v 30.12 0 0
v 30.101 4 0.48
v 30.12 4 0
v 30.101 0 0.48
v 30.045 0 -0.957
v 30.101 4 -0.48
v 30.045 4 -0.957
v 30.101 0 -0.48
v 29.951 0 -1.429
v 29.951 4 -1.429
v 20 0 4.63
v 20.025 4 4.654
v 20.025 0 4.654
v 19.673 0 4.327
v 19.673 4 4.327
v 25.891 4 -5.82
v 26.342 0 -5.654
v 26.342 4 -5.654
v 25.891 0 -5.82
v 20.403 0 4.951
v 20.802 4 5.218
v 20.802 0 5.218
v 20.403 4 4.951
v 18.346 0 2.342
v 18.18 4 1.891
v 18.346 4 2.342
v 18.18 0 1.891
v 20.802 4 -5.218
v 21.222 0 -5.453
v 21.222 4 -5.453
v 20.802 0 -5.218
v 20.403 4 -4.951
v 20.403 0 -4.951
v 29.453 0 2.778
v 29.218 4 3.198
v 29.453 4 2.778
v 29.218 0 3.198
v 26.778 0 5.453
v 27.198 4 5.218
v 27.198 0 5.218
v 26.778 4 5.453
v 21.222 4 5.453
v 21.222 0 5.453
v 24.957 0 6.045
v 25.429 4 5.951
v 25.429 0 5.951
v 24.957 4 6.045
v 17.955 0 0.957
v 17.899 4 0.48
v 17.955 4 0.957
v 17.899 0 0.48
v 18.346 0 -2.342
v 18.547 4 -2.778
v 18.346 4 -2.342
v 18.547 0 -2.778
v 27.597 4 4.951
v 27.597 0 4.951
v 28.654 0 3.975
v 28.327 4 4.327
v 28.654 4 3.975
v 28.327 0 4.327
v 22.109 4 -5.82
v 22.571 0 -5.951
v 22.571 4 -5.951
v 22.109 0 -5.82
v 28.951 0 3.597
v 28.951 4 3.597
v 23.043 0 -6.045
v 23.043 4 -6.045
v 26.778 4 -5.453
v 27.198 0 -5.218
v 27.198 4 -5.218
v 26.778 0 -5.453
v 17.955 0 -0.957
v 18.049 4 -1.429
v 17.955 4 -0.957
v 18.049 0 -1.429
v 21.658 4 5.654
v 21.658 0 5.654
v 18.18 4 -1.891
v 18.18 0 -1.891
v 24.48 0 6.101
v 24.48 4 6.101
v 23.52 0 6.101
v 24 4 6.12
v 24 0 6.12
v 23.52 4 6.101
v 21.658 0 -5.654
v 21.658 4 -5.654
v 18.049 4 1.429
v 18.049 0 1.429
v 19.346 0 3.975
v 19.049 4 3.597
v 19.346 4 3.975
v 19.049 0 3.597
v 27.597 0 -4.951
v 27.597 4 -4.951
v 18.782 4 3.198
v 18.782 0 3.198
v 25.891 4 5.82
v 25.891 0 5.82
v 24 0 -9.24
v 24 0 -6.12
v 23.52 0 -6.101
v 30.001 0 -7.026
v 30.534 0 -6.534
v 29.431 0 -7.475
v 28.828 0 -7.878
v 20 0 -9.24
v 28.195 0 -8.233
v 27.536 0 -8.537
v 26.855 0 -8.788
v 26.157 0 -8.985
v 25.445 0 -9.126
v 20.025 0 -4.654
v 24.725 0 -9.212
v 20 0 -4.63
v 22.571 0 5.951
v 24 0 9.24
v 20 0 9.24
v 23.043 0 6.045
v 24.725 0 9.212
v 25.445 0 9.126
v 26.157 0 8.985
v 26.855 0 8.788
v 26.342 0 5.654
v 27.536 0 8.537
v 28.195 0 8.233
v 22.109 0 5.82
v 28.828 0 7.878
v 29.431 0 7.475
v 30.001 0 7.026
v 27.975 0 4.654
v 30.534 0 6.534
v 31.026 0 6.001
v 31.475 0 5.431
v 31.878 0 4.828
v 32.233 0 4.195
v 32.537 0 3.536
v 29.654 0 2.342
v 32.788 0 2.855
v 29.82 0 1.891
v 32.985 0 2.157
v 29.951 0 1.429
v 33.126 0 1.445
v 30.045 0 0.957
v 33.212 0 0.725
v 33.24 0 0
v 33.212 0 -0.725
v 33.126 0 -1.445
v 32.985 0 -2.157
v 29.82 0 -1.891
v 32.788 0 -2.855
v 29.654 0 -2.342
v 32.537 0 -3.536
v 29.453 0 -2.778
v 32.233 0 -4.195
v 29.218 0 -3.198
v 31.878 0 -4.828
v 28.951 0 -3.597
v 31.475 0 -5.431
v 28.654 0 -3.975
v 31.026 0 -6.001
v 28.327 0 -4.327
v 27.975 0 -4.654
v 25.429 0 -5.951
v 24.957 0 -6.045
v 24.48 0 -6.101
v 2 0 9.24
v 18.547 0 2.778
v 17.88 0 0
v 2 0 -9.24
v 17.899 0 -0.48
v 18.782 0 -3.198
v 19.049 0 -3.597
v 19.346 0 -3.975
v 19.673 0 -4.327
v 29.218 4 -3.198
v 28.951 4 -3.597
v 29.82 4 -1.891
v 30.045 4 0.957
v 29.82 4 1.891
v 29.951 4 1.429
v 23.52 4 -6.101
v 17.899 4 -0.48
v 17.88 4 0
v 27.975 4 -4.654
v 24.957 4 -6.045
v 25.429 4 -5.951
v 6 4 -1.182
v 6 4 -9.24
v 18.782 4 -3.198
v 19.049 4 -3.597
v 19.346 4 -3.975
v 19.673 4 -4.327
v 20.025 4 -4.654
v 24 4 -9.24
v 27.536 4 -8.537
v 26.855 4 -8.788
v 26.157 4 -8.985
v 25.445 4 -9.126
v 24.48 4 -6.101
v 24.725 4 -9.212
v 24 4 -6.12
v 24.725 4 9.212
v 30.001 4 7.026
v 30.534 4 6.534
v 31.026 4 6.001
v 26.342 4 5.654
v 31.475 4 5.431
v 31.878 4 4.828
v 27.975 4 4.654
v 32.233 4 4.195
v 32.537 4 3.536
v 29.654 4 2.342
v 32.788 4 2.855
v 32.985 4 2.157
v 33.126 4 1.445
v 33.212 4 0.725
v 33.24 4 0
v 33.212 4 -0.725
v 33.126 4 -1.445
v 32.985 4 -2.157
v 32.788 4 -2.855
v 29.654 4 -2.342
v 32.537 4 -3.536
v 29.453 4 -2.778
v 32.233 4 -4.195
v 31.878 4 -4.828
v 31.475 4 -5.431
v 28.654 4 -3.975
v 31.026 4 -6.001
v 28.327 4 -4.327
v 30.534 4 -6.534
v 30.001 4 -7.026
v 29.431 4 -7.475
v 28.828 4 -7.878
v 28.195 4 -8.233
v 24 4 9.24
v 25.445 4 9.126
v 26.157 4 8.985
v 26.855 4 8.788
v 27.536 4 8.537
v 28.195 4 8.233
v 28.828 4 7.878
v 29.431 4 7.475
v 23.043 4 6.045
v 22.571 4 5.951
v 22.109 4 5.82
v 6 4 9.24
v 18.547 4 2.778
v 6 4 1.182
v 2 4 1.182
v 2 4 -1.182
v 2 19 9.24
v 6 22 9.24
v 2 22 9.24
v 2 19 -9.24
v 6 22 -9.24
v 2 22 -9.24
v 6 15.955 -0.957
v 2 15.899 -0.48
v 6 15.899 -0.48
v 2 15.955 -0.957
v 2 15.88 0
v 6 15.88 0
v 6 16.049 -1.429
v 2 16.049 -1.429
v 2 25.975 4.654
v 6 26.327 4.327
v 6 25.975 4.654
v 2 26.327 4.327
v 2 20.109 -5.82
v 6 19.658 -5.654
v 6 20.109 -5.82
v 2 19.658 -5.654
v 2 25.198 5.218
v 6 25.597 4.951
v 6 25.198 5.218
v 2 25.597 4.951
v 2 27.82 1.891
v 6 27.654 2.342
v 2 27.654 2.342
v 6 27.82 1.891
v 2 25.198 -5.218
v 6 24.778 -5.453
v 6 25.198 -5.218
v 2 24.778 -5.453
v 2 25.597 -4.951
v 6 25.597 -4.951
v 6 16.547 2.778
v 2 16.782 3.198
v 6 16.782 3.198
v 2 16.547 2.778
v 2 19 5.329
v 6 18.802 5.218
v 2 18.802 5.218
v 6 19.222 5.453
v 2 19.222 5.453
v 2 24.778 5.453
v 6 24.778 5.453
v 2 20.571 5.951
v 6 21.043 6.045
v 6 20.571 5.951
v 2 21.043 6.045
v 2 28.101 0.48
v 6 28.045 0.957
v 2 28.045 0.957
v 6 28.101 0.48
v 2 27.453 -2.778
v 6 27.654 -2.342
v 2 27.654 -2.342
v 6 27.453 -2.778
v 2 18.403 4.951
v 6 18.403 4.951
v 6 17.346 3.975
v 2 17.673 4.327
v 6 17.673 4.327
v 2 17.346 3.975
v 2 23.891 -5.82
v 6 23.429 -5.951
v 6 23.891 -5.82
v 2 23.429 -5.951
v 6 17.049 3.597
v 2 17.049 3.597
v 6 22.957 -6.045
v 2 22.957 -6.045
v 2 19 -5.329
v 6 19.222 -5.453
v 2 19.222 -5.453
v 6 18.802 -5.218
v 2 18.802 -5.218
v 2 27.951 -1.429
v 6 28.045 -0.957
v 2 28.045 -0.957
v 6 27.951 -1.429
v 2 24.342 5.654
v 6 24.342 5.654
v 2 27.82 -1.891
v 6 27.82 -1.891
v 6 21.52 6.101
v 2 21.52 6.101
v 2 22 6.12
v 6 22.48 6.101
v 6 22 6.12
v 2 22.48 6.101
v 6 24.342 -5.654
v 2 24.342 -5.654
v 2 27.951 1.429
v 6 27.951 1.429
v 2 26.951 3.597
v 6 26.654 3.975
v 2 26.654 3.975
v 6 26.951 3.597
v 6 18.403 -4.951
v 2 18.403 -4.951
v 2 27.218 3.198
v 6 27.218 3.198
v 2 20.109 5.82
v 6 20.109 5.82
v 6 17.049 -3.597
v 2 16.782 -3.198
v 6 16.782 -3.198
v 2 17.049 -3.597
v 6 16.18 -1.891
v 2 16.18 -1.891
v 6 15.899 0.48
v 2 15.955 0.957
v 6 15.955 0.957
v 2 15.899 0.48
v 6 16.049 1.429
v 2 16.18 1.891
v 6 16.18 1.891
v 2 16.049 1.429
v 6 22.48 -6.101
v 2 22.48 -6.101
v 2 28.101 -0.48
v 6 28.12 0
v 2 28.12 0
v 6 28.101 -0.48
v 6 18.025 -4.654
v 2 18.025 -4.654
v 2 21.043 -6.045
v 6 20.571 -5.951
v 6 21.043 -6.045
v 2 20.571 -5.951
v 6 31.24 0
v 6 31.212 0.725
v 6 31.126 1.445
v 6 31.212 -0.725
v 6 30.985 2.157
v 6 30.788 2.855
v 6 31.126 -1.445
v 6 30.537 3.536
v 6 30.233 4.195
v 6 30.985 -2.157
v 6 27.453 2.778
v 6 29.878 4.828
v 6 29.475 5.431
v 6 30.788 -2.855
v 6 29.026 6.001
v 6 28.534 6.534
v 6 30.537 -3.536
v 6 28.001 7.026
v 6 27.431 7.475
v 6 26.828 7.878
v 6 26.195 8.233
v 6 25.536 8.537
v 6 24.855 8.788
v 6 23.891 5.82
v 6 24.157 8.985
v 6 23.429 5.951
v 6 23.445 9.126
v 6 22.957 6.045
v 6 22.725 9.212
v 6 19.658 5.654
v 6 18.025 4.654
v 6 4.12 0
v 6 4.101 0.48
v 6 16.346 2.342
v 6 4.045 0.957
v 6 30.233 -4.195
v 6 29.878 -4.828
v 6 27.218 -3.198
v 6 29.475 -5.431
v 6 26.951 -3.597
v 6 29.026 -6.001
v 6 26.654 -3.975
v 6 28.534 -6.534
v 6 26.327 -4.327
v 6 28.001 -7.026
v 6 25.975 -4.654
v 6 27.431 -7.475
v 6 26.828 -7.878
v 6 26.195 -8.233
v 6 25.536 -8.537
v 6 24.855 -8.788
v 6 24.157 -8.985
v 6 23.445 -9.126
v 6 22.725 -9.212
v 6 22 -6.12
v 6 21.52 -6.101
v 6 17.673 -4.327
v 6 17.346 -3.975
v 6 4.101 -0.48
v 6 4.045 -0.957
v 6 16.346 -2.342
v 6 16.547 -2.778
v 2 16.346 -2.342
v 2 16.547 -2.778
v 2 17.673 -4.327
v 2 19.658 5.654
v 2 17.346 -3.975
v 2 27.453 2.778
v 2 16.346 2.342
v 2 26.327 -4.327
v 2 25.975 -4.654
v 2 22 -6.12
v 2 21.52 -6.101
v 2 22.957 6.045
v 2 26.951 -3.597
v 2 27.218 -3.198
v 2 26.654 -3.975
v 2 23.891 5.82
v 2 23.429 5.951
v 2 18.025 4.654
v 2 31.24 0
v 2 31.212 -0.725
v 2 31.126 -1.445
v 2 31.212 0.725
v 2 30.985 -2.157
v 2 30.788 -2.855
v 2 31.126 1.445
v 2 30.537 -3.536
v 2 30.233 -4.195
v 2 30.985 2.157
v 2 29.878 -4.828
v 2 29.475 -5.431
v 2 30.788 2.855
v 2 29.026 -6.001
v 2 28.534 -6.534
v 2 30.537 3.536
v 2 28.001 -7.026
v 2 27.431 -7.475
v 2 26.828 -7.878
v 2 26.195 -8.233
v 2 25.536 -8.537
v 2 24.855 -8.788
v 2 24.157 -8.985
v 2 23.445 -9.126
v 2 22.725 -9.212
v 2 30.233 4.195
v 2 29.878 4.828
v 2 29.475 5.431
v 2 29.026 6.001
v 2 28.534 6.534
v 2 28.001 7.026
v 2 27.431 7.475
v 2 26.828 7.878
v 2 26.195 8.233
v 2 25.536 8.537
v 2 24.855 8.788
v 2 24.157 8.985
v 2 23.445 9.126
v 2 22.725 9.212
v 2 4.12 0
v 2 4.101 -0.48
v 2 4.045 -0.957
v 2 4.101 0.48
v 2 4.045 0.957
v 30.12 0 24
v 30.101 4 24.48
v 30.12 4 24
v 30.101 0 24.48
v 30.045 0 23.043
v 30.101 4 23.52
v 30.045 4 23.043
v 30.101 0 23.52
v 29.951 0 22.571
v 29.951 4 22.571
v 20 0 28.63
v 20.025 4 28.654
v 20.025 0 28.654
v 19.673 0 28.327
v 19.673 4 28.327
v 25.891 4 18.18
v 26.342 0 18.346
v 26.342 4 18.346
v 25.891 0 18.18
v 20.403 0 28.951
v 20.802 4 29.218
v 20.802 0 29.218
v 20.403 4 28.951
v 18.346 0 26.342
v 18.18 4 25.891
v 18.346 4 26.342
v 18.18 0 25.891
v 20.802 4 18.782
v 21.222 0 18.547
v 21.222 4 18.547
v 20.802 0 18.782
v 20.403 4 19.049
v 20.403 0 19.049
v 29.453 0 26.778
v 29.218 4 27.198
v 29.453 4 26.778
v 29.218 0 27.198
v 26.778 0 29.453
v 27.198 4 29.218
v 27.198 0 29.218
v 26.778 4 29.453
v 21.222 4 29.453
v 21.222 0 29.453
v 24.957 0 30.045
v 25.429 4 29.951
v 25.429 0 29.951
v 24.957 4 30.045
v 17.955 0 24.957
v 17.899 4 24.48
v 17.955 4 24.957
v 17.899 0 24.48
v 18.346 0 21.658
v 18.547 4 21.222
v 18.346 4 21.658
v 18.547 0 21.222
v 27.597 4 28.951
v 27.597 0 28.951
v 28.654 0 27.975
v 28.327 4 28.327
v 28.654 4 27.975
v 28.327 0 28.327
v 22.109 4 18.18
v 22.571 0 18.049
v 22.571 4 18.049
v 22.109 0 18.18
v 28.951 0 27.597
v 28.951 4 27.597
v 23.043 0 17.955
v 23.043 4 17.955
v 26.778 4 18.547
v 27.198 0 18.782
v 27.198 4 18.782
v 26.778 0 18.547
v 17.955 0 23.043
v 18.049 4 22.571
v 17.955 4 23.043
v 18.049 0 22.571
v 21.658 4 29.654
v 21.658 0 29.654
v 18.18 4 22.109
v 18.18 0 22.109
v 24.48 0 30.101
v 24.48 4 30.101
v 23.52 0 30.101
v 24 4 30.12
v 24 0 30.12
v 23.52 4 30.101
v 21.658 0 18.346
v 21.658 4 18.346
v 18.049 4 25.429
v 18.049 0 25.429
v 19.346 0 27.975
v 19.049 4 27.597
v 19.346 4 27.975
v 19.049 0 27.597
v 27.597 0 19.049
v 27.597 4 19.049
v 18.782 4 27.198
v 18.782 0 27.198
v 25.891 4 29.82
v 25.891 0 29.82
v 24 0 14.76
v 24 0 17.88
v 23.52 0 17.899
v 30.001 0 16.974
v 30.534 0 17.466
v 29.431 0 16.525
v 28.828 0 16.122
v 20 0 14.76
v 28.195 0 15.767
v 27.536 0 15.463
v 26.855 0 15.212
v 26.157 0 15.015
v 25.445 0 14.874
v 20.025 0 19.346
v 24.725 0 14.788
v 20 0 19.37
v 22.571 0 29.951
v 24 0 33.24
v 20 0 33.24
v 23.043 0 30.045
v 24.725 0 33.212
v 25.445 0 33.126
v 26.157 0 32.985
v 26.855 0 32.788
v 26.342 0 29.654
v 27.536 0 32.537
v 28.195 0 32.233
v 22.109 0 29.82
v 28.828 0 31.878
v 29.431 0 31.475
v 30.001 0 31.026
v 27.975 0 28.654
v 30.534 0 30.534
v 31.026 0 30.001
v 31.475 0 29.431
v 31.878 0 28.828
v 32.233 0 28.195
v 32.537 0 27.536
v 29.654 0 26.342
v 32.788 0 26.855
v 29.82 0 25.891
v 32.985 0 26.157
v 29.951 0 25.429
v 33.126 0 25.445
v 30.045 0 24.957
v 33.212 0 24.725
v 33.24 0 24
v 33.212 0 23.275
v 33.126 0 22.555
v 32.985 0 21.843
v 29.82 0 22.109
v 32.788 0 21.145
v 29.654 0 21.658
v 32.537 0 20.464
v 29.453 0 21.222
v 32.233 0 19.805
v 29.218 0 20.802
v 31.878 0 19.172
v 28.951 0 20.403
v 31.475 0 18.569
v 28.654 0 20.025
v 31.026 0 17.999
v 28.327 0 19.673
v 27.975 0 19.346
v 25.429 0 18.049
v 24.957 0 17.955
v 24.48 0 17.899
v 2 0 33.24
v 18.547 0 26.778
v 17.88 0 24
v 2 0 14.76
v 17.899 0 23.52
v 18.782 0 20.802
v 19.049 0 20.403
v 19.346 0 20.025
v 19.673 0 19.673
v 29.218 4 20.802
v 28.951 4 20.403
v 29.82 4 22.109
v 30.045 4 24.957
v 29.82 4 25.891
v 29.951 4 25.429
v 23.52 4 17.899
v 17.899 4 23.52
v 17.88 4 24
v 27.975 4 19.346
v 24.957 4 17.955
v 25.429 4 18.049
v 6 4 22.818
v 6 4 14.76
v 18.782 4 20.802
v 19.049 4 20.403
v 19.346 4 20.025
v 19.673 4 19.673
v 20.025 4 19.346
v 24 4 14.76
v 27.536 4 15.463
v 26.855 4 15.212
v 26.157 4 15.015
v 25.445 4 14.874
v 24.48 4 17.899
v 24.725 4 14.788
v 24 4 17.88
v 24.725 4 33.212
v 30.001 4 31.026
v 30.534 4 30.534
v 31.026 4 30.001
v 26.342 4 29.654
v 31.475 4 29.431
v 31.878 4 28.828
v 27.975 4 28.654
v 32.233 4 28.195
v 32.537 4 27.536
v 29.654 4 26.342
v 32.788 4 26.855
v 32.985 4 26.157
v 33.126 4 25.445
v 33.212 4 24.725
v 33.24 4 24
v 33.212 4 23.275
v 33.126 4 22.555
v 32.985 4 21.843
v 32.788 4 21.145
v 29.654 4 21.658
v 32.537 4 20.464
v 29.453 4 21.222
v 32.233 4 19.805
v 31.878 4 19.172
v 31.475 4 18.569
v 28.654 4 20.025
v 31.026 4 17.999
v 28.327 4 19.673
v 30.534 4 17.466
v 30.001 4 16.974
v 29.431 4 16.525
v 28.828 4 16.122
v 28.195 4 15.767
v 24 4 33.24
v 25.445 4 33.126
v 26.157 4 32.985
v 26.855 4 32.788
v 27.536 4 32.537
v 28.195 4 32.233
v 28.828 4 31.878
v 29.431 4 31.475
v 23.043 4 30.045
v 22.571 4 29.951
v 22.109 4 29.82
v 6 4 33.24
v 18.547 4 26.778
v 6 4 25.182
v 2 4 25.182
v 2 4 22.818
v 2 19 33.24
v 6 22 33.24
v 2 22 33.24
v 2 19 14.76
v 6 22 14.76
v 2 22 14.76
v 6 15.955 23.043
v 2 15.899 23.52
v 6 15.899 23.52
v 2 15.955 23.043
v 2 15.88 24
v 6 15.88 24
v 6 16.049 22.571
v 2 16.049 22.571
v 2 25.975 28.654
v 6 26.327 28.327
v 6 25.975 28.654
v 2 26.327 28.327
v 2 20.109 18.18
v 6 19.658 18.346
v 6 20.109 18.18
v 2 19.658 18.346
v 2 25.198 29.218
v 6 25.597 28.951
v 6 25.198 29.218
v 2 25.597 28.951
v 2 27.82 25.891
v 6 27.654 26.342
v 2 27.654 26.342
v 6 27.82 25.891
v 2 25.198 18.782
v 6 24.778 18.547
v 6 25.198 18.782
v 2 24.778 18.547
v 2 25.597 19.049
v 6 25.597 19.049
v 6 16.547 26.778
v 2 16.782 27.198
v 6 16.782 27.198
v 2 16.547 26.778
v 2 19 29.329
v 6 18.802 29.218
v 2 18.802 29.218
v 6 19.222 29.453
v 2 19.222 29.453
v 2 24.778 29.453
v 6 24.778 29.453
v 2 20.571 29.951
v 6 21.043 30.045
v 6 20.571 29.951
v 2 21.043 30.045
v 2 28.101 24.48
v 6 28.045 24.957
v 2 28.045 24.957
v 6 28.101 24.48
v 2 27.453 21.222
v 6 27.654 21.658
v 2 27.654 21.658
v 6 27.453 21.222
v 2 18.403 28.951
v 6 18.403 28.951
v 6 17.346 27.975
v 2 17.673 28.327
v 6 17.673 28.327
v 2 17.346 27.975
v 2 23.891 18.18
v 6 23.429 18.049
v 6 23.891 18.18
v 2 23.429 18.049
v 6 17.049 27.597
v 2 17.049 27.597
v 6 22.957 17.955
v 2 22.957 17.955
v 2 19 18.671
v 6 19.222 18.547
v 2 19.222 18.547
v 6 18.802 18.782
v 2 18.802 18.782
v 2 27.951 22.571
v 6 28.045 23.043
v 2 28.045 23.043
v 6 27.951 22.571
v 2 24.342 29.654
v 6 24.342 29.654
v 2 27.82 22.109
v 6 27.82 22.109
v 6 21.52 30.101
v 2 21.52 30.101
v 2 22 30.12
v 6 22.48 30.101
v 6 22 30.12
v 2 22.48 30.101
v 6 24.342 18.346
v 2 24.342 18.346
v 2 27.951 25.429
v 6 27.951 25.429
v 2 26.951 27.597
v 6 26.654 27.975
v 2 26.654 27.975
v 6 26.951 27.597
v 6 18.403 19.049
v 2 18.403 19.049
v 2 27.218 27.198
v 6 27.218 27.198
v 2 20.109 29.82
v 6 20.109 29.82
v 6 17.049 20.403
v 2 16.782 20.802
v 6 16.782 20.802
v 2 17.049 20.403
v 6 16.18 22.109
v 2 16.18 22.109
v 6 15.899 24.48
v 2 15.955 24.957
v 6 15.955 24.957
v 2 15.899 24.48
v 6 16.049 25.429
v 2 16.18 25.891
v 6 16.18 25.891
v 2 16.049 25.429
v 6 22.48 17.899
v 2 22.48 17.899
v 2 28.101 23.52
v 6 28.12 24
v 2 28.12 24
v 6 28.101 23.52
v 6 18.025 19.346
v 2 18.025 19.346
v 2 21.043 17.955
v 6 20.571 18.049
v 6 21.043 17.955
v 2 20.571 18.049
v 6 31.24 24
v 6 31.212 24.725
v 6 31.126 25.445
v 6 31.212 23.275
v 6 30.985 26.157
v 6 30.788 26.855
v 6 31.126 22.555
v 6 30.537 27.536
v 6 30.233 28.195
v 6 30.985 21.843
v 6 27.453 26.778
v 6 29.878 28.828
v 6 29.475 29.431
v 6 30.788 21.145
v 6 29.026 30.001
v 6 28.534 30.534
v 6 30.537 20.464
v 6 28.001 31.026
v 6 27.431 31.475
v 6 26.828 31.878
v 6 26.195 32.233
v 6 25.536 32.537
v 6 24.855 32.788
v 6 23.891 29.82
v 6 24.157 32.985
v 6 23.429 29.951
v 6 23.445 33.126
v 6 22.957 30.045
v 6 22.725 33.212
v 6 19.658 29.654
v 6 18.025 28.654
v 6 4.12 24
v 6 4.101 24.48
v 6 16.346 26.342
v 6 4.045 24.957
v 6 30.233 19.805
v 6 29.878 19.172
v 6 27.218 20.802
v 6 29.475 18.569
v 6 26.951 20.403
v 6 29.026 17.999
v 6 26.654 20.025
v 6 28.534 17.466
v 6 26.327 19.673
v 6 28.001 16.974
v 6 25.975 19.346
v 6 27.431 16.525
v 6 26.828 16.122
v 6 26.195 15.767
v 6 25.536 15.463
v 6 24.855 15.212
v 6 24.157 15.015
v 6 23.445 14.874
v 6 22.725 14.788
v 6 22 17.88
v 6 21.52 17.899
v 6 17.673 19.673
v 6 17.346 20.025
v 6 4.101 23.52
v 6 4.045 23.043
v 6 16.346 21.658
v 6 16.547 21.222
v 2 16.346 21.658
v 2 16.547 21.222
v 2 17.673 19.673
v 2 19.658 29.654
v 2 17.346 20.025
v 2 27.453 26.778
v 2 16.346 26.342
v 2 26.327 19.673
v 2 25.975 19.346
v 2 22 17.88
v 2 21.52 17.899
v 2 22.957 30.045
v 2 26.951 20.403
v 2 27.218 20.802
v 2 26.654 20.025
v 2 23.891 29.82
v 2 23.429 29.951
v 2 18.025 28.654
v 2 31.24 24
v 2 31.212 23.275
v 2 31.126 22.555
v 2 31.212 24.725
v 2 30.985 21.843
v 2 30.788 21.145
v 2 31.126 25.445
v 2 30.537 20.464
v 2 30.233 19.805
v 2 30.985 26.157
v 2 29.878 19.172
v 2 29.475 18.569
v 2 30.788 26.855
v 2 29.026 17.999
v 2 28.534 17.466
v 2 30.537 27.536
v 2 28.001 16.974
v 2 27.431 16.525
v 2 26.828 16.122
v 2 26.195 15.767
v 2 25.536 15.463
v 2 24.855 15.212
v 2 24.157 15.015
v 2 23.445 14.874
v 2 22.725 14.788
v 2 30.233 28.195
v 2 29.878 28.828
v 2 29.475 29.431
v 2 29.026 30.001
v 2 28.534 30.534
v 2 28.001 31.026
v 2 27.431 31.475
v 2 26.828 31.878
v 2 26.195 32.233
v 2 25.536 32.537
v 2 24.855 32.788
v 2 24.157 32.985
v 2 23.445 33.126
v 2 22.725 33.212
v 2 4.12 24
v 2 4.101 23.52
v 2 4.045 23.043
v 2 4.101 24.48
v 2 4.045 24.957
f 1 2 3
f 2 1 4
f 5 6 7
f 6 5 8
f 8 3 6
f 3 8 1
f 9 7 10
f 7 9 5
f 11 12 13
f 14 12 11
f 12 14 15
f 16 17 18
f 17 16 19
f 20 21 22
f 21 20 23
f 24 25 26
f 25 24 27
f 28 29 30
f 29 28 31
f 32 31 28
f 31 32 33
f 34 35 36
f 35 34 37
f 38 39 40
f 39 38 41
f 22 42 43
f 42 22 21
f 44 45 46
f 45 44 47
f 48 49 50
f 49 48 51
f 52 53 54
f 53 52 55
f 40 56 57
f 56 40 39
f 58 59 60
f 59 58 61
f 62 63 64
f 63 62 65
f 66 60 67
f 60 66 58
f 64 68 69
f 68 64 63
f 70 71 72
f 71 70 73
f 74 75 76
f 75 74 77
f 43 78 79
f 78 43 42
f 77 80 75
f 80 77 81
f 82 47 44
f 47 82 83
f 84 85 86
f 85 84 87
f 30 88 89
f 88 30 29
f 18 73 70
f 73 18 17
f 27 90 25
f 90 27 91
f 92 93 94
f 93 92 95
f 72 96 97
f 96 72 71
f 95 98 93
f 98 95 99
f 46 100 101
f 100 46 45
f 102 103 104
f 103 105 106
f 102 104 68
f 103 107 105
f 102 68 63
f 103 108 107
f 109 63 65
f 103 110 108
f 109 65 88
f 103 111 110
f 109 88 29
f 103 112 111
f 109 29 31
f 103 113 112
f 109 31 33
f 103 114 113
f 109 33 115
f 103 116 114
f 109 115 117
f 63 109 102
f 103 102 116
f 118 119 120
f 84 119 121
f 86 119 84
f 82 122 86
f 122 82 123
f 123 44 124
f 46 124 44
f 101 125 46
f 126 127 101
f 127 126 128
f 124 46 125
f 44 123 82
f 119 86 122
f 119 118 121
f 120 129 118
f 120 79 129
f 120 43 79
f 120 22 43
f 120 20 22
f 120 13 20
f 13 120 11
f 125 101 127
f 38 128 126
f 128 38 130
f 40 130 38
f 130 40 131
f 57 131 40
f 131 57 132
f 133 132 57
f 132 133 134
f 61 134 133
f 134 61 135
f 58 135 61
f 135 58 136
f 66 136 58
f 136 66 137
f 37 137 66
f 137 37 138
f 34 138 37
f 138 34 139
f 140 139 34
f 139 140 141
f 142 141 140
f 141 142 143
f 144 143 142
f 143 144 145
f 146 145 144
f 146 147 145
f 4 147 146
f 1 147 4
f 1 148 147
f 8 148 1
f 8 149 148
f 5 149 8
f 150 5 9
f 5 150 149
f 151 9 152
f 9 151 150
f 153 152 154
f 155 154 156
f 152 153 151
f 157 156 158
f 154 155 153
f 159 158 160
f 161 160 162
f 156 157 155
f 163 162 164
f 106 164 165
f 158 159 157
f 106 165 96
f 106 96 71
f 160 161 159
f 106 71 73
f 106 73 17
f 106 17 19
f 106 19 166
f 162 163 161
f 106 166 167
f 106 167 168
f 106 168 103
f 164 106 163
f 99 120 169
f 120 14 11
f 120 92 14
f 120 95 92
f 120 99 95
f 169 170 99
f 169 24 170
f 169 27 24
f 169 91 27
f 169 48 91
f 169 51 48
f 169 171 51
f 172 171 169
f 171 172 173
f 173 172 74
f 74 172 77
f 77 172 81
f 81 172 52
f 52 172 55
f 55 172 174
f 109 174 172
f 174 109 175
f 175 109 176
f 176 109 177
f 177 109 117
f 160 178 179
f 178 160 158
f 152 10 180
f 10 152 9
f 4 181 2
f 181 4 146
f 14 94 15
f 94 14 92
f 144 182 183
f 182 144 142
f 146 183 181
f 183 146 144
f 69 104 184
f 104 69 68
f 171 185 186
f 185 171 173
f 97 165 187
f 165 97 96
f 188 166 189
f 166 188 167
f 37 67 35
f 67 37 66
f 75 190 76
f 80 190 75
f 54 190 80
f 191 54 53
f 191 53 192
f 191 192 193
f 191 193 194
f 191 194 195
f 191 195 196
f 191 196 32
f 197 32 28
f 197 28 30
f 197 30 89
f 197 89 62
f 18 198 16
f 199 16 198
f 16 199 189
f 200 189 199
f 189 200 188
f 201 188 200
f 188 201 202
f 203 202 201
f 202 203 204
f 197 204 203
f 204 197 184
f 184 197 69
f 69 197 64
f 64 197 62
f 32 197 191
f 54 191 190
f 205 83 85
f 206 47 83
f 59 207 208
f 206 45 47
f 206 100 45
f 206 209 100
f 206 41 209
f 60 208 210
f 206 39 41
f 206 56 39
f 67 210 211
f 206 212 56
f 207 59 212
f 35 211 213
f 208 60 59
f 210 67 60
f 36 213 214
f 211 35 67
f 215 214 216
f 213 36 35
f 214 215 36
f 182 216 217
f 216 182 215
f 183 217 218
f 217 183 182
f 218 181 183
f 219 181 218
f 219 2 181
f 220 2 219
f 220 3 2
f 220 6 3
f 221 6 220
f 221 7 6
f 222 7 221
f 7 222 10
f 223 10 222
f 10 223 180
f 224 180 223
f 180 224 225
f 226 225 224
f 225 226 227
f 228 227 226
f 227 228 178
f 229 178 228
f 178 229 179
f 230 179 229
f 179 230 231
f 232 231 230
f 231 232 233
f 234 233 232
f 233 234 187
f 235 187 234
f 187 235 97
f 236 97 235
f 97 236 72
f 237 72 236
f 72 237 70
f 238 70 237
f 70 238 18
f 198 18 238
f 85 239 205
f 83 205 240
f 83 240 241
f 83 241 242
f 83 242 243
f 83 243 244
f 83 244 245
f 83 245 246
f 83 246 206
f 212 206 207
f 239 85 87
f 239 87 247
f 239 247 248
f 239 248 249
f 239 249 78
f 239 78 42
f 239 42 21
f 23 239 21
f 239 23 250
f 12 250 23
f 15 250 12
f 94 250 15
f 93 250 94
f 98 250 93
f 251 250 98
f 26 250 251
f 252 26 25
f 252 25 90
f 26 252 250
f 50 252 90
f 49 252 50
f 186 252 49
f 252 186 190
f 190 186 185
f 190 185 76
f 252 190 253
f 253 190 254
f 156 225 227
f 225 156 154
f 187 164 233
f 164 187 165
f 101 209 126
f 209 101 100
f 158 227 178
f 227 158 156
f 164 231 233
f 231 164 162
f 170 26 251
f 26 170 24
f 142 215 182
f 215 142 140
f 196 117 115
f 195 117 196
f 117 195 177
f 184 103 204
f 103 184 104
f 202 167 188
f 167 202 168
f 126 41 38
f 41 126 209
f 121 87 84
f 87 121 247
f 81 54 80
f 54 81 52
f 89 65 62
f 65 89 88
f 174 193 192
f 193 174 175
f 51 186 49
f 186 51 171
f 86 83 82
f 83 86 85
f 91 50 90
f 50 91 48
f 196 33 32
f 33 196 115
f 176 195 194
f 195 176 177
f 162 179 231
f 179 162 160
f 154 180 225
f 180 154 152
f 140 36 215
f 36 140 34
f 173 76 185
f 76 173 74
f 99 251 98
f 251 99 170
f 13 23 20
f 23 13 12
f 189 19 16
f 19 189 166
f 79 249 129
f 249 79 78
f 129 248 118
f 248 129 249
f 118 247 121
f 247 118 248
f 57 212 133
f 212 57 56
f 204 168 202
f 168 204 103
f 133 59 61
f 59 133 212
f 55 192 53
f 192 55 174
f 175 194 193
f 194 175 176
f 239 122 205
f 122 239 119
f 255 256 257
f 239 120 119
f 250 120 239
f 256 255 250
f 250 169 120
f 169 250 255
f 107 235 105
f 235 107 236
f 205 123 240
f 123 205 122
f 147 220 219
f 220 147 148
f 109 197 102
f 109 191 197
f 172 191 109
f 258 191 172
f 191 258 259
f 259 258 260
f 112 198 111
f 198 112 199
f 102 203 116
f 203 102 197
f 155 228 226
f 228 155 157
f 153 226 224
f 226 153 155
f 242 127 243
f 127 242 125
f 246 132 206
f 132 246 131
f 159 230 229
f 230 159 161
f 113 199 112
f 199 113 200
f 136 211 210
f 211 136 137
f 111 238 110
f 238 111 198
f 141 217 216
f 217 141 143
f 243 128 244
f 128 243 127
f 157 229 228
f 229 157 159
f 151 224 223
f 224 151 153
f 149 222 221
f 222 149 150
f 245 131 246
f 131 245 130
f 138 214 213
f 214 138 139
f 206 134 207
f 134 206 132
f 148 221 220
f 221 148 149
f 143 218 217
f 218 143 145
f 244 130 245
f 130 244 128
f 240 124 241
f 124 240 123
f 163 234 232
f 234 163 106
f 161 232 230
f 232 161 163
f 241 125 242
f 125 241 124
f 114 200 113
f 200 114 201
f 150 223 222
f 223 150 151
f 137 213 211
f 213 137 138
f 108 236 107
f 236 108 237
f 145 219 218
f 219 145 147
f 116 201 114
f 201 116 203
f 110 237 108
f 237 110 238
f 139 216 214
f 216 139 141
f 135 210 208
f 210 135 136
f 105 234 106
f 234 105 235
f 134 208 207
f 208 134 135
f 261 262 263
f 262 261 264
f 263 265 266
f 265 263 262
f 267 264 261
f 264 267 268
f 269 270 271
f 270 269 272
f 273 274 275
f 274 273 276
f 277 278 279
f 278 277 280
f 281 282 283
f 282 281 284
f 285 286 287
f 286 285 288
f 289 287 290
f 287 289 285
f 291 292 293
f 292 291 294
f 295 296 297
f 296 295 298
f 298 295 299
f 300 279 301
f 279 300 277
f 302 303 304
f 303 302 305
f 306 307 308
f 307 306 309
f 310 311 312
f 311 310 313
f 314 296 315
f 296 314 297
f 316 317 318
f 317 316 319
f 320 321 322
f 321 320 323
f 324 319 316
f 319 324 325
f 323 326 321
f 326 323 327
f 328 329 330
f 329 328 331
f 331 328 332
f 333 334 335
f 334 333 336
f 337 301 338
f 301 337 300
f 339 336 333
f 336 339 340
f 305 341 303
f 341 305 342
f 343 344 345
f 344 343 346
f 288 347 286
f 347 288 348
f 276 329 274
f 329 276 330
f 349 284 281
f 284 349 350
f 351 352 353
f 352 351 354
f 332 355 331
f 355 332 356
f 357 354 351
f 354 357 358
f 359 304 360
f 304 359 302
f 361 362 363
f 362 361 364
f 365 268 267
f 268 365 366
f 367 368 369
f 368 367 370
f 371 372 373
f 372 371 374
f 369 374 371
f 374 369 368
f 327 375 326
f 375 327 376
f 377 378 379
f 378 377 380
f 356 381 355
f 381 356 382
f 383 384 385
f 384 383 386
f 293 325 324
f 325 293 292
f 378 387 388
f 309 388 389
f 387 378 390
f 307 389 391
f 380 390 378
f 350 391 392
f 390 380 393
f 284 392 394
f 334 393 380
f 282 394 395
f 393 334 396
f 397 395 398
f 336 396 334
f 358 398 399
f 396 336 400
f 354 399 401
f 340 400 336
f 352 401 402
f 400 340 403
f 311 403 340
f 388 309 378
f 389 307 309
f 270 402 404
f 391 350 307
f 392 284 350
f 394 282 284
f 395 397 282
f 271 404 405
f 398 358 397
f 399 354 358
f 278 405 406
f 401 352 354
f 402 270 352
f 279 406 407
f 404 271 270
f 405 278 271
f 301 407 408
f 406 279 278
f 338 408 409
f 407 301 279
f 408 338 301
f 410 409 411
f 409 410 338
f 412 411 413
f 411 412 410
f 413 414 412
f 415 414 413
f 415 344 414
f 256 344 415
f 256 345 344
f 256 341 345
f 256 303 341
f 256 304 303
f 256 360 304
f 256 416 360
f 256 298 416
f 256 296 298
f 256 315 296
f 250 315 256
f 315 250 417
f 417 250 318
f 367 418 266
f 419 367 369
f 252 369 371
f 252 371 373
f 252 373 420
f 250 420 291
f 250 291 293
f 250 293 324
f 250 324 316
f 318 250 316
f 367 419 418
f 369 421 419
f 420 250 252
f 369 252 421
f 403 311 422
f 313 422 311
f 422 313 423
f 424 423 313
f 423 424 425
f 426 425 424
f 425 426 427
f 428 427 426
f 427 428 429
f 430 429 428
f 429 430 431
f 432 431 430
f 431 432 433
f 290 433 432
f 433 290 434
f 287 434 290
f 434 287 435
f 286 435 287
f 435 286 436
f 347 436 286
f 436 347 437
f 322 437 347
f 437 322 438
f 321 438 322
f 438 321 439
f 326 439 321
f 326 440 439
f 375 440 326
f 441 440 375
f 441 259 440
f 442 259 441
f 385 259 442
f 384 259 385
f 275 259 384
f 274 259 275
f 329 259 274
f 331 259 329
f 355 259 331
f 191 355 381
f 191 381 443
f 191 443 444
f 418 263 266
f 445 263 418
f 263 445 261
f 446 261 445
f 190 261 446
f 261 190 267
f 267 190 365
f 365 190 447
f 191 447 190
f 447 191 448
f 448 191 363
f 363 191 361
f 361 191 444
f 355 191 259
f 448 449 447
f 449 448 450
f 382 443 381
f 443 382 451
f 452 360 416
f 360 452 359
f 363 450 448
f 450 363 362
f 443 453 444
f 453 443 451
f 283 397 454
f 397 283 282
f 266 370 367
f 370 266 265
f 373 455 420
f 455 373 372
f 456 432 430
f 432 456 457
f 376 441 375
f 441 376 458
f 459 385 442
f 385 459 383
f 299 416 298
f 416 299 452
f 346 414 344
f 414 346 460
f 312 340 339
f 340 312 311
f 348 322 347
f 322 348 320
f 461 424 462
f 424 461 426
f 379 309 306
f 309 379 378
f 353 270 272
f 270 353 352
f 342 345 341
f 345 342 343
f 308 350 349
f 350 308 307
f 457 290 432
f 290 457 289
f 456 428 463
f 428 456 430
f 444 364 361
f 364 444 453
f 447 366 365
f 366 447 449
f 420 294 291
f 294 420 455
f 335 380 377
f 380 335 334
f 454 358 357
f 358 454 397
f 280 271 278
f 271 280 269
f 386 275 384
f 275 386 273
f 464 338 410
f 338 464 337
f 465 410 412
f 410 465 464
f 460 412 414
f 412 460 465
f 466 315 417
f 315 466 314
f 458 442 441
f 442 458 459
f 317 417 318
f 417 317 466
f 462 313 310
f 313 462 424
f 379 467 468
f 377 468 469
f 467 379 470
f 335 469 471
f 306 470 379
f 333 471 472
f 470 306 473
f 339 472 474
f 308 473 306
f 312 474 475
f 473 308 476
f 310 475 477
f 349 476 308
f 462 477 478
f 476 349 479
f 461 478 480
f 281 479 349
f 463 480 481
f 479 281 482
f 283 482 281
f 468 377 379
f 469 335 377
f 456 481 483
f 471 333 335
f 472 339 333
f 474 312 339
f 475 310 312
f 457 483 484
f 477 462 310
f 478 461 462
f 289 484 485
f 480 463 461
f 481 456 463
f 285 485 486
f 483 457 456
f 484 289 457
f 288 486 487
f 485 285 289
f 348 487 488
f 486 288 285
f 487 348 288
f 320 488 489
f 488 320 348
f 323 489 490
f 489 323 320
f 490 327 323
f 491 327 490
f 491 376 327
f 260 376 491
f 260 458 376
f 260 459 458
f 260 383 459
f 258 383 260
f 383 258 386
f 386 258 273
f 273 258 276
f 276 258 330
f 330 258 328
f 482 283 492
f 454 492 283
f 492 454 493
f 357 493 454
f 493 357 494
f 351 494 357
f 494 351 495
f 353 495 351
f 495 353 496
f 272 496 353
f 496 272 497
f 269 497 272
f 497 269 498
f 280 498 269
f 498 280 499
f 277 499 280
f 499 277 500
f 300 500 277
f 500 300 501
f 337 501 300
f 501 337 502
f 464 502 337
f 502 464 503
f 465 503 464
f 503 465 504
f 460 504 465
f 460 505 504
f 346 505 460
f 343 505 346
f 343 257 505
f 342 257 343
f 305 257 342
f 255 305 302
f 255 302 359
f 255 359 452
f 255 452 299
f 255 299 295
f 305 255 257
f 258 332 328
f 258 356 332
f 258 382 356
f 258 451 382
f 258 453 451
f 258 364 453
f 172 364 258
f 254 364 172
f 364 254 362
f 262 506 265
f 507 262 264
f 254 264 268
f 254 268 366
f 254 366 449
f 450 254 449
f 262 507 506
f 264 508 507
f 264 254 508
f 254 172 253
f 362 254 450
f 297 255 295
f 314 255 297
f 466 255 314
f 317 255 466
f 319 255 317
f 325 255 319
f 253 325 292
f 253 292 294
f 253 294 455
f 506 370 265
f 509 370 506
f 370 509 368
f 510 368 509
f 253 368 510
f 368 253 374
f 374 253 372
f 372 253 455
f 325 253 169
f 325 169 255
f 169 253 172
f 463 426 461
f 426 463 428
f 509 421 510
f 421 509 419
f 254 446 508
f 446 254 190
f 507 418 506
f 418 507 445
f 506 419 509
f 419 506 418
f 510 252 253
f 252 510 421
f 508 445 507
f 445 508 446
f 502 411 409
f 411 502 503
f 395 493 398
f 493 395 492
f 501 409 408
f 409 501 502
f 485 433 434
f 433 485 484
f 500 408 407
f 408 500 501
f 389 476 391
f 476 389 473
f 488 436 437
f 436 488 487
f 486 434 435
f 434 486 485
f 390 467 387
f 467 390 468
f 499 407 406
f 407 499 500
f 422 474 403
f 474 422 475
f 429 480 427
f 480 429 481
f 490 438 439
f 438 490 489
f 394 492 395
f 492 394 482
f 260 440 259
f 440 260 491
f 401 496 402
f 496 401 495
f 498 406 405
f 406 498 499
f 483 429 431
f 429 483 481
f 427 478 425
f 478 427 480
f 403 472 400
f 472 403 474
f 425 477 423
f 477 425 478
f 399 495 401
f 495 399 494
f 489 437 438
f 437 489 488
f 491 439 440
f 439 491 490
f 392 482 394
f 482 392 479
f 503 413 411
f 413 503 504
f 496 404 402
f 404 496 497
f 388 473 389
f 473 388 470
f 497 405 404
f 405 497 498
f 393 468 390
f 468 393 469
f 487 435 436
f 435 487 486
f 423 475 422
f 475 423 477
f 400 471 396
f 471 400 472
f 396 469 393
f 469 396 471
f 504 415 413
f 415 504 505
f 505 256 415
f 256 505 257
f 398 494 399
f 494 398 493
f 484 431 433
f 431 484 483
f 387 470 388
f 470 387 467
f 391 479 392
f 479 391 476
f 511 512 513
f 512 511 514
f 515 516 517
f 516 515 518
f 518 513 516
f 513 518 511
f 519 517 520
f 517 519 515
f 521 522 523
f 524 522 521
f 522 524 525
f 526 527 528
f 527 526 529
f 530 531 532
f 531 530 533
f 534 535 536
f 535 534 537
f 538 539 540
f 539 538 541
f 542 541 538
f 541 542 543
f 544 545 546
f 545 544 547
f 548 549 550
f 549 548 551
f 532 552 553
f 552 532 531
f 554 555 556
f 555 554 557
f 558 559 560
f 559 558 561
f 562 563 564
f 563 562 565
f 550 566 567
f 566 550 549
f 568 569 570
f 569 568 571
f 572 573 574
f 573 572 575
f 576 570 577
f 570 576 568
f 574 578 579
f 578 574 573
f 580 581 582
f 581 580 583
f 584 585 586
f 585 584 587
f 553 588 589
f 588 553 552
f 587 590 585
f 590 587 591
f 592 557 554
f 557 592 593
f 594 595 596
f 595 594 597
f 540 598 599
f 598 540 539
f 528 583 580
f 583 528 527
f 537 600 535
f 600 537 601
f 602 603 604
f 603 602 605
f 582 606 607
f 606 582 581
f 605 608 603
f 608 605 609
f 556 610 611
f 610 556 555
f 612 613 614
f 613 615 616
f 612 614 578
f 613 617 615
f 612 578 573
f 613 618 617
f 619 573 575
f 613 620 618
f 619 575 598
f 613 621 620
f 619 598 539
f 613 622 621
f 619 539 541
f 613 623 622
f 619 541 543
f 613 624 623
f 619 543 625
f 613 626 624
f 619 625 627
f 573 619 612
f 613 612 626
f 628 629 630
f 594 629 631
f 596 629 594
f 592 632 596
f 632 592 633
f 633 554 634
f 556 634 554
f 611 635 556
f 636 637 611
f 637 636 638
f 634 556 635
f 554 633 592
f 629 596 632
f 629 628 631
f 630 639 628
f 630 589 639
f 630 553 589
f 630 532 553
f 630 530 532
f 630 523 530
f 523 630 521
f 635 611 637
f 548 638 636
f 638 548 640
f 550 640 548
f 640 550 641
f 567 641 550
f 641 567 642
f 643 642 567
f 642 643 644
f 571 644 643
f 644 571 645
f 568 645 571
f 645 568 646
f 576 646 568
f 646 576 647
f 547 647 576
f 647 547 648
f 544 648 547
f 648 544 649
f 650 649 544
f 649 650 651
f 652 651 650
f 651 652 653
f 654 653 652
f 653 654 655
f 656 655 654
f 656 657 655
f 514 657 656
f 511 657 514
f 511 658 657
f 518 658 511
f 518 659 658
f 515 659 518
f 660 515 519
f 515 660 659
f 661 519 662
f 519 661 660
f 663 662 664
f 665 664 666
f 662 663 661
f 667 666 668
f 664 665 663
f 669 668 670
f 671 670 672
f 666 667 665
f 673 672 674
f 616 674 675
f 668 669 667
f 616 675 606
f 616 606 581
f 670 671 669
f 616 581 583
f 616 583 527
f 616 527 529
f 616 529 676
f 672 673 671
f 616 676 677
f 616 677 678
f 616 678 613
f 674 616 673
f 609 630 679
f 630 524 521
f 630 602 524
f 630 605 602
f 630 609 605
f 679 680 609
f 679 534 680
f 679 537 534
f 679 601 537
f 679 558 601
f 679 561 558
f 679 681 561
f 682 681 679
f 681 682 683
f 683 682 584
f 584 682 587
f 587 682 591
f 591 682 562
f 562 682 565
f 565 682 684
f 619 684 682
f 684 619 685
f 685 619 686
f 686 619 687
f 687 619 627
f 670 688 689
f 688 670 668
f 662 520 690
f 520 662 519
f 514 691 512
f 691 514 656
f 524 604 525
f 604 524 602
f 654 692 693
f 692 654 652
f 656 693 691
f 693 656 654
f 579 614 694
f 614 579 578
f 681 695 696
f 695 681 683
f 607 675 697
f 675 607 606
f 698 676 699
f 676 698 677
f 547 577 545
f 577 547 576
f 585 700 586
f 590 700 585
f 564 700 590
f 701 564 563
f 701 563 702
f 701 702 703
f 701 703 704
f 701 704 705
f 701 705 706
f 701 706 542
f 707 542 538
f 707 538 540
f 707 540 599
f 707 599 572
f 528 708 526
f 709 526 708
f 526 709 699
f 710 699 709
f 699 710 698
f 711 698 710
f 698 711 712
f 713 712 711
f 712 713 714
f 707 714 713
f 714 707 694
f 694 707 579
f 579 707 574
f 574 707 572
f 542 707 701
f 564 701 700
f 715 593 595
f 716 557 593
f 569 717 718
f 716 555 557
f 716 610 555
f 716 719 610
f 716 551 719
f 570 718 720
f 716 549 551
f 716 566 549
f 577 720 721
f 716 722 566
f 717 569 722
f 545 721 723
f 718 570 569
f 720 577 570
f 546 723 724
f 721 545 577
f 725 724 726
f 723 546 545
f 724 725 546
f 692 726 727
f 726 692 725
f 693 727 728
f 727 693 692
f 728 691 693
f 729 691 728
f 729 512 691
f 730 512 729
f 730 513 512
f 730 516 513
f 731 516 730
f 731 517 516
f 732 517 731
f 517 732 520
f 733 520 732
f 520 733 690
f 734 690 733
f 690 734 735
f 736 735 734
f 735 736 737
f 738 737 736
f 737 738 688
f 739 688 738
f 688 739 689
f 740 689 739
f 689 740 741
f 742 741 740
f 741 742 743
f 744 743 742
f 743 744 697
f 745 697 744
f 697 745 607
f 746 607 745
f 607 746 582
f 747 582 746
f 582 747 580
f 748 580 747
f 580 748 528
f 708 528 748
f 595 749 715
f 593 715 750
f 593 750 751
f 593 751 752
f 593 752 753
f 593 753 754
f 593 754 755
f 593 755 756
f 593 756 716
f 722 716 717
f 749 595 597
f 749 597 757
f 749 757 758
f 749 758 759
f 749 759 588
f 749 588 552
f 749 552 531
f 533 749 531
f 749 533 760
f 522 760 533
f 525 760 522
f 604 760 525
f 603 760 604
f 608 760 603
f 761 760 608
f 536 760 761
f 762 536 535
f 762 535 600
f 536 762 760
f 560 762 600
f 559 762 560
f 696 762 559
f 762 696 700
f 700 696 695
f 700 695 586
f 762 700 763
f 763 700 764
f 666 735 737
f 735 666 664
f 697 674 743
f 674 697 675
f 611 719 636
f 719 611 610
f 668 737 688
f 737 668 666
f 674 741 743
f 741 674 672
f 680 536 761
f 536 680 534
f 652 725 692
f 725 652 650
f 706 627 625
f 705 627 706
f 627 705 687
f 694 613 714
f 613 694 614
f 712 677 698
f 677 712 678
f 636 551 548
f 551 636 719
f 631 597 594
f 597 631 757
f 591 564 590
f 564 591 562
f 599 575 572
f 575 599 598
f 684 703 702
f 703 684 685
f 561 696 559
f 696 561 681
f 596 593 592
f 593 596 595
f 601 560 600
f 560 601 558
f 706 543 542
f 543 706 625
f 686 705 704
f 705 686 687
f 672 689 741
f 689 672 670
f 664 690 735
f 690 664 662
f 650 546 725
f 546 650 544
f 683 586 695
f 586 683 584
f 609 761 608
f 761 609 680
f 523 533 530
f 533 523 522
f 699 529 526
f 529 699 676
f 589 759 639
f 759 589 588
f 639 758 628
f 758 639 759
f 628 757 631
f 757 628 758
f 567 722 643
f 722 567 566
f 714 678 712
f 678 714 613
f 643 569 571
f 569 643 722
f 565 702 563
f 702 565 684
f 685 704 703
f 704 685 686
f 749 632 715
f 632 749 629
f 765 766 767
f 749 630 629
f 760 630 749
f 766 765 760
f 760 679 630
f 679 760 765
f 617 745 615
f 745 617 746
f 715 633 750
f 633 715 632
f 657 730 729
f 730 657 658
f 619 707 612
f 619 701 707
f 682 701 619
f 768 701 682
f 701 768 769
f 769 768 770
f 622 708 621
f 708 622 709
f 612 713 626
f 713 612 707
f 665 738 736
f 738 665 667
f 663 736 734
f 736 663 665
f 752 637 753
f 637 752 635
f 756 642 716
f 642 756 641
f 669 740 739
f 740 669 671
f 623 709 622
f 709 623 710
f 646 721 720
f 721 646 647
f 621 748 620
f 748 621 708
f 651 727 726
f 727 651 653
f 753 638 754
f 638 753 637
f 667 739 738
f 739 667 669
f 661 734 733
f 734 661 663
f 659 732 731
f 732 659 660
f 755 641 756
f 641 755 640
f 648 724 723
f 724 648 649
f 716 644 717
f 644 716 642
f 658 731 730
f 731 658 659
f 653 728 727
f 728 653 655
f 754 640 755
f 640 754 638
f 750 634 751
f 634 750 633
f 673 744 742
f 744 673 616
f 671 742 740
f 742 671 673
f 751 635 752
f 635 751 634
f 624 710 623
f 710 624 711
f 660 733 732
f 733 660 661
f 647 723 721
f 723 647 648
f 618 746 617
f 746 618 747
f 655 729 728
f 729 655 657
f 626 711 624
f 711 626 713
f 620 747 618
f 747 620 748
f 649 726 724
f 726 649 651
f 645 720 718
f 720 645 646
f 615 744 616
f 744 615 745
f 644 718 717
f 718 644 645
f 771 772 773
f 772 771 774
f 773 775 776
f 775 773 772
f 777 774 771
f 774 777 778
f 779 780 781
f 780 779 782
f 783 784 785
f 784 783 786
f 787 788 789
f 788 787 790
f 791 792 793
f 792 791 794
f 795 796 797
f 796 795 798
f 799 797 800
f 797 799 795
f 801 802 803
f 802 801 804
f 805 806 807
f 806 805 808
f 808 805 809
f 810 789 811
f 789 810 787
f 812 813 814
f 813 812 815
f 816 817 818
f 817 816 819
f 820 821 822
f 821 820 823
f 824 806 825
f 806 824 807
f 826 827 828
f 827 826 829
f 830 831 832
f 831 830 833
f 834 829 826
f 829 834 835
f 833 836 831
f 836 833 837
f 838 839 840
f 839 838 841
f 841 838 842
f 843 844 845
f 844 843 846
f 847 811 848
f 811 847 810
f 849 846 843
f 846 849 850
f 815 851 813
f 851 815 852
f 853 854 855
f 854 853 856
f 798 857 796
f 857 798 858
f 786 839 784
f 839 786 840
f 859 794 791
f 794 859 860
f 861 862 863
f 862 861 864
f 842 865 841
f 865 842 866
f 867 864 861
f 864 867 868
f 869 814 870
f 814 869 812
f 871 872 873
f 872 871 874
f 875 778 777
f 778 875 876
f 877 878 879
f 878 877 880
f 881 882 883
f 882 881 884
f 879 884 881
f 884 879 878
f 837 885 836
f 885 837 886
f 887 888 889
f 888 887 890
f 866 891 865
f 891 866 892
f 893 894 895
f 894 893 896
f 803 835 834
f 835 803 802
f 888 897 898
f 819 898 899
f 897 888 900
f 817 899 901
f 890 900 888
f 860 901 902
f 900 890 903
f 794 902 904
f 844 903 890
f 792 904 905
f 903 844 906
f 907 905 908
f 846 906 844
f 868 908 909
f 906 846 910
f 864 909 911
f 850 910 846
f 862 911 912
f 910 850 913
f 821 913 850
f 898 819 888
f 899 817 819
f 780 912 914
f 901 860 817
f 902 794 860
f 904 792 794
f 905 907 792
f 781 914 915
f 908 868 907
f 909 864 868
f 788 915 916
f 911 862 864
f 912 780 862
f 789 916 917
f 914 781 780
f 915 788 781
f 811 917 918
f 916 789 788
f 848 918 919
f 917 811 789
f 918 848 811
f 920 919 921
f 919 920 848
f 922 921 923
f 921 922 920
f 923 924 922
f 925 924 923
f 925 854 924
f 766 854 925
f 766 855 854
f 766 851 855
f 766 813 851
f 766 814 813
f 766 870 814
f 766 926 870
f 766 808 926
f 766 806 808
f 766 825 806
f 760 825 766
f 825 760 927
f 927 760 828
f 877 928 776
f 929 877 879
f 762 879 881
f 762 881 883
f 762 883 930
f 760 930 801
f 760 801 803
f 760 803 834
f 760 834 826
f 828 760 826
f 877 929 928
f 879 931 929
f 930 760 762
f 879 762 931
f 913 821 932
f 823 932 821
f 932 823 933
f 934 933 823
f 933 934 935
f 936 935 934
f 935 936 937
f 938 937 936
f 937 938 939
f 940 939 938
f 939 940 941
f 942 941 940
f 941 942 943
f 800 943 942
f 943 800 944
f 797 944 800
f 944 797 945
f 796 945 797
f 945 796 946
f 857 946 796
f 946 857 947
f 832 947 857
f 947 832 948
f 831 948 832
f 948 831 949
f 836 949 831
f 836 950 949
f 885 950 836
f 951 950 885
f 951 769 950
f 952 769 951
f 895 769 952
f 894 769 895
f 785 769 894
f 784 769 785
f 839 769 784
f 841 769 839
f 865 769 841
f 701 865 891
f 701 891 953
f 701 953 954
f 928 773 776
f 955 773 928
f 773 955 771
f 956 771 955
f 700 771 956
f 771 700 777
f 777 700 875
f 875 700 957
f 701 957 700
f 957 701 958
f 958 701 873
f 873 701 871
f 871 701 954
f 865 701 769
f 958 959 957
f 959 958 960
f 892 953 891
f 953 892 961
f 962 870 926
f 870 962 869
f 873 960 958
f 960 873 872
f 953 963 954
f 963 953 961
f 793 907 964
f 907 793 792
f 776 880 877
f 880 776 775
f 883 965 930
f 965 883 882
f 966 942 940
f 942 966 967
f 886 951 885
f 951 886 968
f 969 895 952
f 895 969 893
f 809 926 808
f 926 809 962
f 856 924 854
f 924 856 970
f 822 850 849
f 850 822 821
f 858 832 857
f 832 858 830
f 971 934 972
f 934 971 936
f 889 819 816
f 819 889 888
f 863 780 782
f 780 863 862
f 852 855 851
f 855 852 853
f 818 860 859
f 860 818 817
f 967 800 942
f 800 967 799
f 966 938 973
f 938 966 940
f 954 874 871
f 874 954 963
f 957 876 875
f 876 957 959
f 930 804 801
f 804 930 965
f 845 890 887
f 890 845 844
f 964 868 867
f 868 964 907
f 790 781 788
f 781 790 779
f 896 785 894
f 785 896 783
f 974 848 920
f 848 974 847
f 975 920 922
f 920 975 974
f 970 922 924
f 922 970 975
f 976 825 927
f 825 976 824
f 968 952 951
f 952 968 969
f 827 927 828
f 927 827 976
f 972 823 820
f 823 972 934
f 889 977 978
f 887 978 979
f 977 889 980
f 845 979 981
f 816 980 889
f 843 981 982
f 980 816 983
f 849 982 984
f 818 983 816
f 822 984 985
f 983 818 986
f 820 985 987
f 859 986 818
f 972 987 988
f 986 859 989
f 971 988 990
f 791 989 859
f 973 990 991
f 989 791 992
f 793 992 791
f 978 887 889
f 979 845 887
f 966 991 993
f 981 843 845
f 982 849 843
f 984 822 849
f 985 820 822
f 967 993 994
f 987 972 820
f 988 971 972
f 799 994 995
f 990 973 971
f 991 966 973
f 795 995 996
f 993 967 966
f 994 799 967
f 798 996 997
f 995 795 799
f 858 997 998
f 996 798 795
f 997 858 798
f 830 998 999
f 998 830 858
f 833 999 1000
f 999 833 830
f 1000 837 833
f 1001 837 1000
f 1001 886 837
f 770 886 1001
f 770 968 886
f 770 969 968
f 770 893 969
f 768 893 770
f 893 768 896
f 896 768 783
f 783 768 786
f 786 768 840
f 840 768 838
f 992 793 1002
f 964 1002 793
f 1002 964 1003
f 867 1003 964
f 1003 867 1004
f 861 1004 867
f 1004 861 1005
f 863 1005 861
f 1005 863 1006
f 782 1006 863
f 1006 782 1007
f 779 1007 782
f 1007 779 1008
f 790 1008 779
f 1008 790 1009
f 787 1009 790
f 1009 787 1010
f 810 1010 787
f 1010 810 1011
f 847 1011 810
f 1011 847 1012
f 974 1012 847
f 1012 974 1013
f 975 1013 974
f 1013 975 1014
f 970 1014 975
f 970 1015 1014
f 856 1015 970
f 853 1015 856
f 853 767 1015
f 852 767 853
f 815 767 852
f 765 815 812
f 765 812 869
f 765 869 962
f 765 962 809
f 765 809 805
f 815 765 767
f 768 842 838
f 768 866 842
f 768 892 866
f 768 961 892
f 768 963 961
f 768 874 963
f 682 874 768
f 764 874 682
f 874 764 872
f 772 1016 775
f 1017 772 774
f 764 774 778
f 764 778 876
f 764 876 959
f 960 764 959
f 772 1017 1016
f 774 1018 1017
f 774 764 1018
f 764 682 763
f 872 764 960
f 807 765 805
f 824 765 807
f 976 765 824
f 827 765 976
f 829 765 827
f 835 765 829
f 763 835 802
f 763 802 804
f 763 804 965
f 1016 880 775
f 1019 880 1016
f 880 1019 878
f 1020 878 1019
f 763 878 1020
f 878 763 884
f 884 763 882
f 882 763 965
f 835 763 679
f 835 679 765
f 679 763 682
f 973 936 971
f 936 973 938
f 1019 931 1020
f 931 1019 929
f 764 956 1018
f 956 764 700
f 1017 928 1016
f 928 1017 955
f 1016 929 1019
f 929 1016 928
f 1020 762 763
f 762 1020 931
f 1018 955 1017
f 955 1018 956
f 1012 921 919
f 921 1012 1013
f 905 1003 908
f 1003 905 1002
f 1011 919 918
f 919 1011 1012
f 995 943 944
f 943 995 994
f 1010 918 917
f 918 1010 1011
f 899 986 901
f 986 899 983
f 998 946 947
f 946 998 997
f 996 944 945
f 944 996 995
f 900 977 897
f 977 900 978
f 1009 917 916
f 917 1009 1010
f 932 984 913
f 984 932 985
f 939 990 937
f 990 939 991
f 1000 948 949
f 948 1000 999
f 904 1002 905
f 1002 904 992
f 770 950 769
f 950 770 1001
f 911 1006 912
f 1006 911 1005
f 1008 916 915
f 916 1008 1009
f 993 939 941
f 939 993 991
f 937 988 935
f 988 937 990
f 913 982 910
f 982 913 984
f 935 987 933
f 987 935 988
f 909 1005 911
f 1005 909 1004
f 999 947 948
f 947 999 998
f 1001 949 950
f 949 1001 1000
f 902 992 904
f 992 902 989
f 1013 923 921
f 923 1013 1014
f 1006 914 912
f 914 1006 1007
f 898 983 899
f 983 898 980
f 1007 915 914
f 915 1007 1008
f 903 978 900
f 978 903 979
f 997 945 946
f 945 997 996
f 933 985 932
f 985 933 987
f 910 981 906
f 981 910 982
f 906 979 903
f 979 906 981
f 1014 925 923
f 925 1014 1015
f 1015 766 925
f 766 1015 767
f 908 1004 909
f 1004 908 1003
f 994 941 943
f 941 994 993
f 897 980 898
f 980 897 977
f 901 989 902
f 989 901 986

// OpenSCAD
// file: inc/constants.scad
pi=3.1415;
$fn=80;
//hole radius
hr = 6;

//distance between holes
dh = 12;

//x distance between holes
dhx = 12;

//y distance between holes
dhy = 14.4;
//dhy=20;

//give between two gears
giveg = .5;

//shaft give
sgive = .6;

//plug give
//pgive = .15;

pgive = .12;


//fastener give (holes)
fgive = .13;

pitch=.25;

//gear give (hole)
ggive = .45;

//spacer give
spgive = .3;


////fastener sizes
//notch width
notchw = 0;

//notch height
notchh = 0;

//fastener height
fh = 4;

//fastener width (sans notch)
fw = hr;


//gear hole radius
ghr = 1.4;

//arrow length
al = 8;


//give for the nut
nut_give = .8;
// file: plate_ny.scad
include <inc/constants.scad>


module plate(width=2, height=2, holes=true)
{
//total width (sans holders)
twidth = width*dhx+width*2*hr;
theight = height*dhy+height*2*hr;

difference()
{
cube([twidth, theight,4]);


  union()
  {
  //translate fastener height
  //for more even-ness
  translate([-fh/2,fh/2,0])
  translate([dhx/2+hr,hr+dhy/2,-1])
  for(i=[0:width-1])
  {
    for(j=[0:height-1])
    {
		if(holes)
      {
      translate([i*hr*2+dhx*i,j*hr*2+j*dhy,0])
      cylinder(r=hr+pgive, h=10);
      }
      
    }
  }

  //fastener holes, bottom
  fasteners();

  //fastener holes, side
  translate([twidth,0,0])
  rotate([0,0,90])
  fasteners(dist=dhy, w=false);
  }
}

module fasteners(dist=dhx, w=true)
{

if(w)
{
for(i=[0:width-1])
{
translate([dist/2+hr-fw/2+i*dist+i*hr*2,0,0])
cube([fw,fh,4]);
}
}
else
{
for(i=[0:height-1])
{
translate([dist/2+hr-fw/2+i*dist+i*hr*2,0,0])
cube([fw,fh,4]);
}
}

}

//top fasteners
translate([0,theight,0])
fasteners();

//side fasteners
rotate([0,0,90])
fasteners(dist=dhy, w=false);



}

plate(4,4);
// file: shaft.scad
include <inc/constants.scad>

//extra radius
slant = 2;


module bar(length=1, square=false, one_hole=true, slanted=false, holes=false, mirrorslanted=false)
{
  th=3;
  width=hr*2;
  len = length*(dh)+hr*2*(length-1);
  
  //outer width
  ow = th+pgive*2;

  


difference()
{
  hull()
  {
  cylinder(r=width/2+ow,h=4);
  translate([len+hr*2,0,0])
  cylinder(r=width/2+ow,h=4);
  }

  union(){
  //hole in the middle
  if(one_hole && length>1)
  hull()
  {
  translate([2*hr+th,0,-1])
  cylinder(r=hr+pgive, h=10);

  translate([len-pgive*4-th,0,-1])
  cylinder(r=hr+pgive, h=10);
  }
  else if(holes)
  {
    for(i=[1:length-1])
  {

  if(holes[i])
  {
  translate([i*dh+i*hr*2,0,0])
  if(square[i])
  {
    if(slanted[i])
      cylinder(r1=hr+ggive, r2=hr+pgive+slant, h=4, $fn=6);
    else
      cylinder(r=hr+ggive, h=4, $fn=6);

  }
  else
  {
    if(slanted[i])
      cylinder(r1=hr+pgive, r2=hr+pgive+slant, h=4);
    else
      cylinder(r=hr+pgive, h=4);

  }
  
  }
  }

  }

  
  //hole on other end
  if(holes[length])
  {
  translate([len+hr*2,0,0])
  if(square[length])
  {
    if(slanted[length])
      cylinder(r1=hr+ggive,r2=hr+ggive+slant, h=4, $fn=6);
    else if(mirrorslanted[length])
      cylinder(r2=hr+pgive, r1=hr+pgive+slant, h=4, $fn=6);
    else
      cylinder(r=hr+ggive,h=4, $fn=6);
    
  }
  else
  {
    if(slanted[length])
      cylinder(r1=hr+pgive, r2=hr+pgive+slant, h=4);
    else
      cylinder(r=hr+pgive,h=4);
  }
  }

  //first hole
  if(holes[0])
  {
  translate([0,0,0])
  if(square[0])
  {
    if(slanted[0])
      cylinder(r1=hr+ggive, r2=hr+pgive+slant, h=4, $fn=6);
    else
      cylinder(r=hr+ggive,h=4, $fn=6);
  }

  else
  {
    if(slanted[0])
      cylinder(r1=hr+pgive, r2=hr+ggive+slant,h=4);
    else
      cylinder(r=hr+pgive,h=4);
  }
  }
  }
}

}

//bar(length=4, one_hole=true, holes=false, square=[true,false,false,false,true], slanted=[true,false,false,false,true]);


//bar(length=1, one_hole=true, holes=false, square=[true,true], slanted=[true,false], mirrorslanted=[true, true]);

//bar(length=4, one_hole=false, holes=true);

bar(holes=[true,true]);
// main file
use <shaft.scad>
use <plate_ny.scad>
include <inc/constants.scad>



module bracket(length=2, height=2, depth=1)
{


  module part()
  {
  difference()
  {
  union()
  {
  bar(length=length, one_hole=false, holes=[false,true,true, true]);

  translate([-4+hr,0,4+hr*4*height-hr])
  rotate([0,90,0])
  bar(length=height, one_hole=false, holes=[true,true,false]);

  }

  translate([0,-10,-20])
  cube([20,20,20]);

  translate([-20+2,-10,-1])
  cube([20,20,20]);


  }
  }

  for(i=[0:depth-1])
  {
  translate([0,0,i*(hr*4)])
  rotate([-90,0,0])
  
  part();
  }
  

}

bracket(length=1, height=1, depth=2);

/*
translate([0,70,0])
rotate([0,0,180])
plate(2,2);

translate([0,4,0])
rotate([-90,0,0])
plate(2,2);

*/
